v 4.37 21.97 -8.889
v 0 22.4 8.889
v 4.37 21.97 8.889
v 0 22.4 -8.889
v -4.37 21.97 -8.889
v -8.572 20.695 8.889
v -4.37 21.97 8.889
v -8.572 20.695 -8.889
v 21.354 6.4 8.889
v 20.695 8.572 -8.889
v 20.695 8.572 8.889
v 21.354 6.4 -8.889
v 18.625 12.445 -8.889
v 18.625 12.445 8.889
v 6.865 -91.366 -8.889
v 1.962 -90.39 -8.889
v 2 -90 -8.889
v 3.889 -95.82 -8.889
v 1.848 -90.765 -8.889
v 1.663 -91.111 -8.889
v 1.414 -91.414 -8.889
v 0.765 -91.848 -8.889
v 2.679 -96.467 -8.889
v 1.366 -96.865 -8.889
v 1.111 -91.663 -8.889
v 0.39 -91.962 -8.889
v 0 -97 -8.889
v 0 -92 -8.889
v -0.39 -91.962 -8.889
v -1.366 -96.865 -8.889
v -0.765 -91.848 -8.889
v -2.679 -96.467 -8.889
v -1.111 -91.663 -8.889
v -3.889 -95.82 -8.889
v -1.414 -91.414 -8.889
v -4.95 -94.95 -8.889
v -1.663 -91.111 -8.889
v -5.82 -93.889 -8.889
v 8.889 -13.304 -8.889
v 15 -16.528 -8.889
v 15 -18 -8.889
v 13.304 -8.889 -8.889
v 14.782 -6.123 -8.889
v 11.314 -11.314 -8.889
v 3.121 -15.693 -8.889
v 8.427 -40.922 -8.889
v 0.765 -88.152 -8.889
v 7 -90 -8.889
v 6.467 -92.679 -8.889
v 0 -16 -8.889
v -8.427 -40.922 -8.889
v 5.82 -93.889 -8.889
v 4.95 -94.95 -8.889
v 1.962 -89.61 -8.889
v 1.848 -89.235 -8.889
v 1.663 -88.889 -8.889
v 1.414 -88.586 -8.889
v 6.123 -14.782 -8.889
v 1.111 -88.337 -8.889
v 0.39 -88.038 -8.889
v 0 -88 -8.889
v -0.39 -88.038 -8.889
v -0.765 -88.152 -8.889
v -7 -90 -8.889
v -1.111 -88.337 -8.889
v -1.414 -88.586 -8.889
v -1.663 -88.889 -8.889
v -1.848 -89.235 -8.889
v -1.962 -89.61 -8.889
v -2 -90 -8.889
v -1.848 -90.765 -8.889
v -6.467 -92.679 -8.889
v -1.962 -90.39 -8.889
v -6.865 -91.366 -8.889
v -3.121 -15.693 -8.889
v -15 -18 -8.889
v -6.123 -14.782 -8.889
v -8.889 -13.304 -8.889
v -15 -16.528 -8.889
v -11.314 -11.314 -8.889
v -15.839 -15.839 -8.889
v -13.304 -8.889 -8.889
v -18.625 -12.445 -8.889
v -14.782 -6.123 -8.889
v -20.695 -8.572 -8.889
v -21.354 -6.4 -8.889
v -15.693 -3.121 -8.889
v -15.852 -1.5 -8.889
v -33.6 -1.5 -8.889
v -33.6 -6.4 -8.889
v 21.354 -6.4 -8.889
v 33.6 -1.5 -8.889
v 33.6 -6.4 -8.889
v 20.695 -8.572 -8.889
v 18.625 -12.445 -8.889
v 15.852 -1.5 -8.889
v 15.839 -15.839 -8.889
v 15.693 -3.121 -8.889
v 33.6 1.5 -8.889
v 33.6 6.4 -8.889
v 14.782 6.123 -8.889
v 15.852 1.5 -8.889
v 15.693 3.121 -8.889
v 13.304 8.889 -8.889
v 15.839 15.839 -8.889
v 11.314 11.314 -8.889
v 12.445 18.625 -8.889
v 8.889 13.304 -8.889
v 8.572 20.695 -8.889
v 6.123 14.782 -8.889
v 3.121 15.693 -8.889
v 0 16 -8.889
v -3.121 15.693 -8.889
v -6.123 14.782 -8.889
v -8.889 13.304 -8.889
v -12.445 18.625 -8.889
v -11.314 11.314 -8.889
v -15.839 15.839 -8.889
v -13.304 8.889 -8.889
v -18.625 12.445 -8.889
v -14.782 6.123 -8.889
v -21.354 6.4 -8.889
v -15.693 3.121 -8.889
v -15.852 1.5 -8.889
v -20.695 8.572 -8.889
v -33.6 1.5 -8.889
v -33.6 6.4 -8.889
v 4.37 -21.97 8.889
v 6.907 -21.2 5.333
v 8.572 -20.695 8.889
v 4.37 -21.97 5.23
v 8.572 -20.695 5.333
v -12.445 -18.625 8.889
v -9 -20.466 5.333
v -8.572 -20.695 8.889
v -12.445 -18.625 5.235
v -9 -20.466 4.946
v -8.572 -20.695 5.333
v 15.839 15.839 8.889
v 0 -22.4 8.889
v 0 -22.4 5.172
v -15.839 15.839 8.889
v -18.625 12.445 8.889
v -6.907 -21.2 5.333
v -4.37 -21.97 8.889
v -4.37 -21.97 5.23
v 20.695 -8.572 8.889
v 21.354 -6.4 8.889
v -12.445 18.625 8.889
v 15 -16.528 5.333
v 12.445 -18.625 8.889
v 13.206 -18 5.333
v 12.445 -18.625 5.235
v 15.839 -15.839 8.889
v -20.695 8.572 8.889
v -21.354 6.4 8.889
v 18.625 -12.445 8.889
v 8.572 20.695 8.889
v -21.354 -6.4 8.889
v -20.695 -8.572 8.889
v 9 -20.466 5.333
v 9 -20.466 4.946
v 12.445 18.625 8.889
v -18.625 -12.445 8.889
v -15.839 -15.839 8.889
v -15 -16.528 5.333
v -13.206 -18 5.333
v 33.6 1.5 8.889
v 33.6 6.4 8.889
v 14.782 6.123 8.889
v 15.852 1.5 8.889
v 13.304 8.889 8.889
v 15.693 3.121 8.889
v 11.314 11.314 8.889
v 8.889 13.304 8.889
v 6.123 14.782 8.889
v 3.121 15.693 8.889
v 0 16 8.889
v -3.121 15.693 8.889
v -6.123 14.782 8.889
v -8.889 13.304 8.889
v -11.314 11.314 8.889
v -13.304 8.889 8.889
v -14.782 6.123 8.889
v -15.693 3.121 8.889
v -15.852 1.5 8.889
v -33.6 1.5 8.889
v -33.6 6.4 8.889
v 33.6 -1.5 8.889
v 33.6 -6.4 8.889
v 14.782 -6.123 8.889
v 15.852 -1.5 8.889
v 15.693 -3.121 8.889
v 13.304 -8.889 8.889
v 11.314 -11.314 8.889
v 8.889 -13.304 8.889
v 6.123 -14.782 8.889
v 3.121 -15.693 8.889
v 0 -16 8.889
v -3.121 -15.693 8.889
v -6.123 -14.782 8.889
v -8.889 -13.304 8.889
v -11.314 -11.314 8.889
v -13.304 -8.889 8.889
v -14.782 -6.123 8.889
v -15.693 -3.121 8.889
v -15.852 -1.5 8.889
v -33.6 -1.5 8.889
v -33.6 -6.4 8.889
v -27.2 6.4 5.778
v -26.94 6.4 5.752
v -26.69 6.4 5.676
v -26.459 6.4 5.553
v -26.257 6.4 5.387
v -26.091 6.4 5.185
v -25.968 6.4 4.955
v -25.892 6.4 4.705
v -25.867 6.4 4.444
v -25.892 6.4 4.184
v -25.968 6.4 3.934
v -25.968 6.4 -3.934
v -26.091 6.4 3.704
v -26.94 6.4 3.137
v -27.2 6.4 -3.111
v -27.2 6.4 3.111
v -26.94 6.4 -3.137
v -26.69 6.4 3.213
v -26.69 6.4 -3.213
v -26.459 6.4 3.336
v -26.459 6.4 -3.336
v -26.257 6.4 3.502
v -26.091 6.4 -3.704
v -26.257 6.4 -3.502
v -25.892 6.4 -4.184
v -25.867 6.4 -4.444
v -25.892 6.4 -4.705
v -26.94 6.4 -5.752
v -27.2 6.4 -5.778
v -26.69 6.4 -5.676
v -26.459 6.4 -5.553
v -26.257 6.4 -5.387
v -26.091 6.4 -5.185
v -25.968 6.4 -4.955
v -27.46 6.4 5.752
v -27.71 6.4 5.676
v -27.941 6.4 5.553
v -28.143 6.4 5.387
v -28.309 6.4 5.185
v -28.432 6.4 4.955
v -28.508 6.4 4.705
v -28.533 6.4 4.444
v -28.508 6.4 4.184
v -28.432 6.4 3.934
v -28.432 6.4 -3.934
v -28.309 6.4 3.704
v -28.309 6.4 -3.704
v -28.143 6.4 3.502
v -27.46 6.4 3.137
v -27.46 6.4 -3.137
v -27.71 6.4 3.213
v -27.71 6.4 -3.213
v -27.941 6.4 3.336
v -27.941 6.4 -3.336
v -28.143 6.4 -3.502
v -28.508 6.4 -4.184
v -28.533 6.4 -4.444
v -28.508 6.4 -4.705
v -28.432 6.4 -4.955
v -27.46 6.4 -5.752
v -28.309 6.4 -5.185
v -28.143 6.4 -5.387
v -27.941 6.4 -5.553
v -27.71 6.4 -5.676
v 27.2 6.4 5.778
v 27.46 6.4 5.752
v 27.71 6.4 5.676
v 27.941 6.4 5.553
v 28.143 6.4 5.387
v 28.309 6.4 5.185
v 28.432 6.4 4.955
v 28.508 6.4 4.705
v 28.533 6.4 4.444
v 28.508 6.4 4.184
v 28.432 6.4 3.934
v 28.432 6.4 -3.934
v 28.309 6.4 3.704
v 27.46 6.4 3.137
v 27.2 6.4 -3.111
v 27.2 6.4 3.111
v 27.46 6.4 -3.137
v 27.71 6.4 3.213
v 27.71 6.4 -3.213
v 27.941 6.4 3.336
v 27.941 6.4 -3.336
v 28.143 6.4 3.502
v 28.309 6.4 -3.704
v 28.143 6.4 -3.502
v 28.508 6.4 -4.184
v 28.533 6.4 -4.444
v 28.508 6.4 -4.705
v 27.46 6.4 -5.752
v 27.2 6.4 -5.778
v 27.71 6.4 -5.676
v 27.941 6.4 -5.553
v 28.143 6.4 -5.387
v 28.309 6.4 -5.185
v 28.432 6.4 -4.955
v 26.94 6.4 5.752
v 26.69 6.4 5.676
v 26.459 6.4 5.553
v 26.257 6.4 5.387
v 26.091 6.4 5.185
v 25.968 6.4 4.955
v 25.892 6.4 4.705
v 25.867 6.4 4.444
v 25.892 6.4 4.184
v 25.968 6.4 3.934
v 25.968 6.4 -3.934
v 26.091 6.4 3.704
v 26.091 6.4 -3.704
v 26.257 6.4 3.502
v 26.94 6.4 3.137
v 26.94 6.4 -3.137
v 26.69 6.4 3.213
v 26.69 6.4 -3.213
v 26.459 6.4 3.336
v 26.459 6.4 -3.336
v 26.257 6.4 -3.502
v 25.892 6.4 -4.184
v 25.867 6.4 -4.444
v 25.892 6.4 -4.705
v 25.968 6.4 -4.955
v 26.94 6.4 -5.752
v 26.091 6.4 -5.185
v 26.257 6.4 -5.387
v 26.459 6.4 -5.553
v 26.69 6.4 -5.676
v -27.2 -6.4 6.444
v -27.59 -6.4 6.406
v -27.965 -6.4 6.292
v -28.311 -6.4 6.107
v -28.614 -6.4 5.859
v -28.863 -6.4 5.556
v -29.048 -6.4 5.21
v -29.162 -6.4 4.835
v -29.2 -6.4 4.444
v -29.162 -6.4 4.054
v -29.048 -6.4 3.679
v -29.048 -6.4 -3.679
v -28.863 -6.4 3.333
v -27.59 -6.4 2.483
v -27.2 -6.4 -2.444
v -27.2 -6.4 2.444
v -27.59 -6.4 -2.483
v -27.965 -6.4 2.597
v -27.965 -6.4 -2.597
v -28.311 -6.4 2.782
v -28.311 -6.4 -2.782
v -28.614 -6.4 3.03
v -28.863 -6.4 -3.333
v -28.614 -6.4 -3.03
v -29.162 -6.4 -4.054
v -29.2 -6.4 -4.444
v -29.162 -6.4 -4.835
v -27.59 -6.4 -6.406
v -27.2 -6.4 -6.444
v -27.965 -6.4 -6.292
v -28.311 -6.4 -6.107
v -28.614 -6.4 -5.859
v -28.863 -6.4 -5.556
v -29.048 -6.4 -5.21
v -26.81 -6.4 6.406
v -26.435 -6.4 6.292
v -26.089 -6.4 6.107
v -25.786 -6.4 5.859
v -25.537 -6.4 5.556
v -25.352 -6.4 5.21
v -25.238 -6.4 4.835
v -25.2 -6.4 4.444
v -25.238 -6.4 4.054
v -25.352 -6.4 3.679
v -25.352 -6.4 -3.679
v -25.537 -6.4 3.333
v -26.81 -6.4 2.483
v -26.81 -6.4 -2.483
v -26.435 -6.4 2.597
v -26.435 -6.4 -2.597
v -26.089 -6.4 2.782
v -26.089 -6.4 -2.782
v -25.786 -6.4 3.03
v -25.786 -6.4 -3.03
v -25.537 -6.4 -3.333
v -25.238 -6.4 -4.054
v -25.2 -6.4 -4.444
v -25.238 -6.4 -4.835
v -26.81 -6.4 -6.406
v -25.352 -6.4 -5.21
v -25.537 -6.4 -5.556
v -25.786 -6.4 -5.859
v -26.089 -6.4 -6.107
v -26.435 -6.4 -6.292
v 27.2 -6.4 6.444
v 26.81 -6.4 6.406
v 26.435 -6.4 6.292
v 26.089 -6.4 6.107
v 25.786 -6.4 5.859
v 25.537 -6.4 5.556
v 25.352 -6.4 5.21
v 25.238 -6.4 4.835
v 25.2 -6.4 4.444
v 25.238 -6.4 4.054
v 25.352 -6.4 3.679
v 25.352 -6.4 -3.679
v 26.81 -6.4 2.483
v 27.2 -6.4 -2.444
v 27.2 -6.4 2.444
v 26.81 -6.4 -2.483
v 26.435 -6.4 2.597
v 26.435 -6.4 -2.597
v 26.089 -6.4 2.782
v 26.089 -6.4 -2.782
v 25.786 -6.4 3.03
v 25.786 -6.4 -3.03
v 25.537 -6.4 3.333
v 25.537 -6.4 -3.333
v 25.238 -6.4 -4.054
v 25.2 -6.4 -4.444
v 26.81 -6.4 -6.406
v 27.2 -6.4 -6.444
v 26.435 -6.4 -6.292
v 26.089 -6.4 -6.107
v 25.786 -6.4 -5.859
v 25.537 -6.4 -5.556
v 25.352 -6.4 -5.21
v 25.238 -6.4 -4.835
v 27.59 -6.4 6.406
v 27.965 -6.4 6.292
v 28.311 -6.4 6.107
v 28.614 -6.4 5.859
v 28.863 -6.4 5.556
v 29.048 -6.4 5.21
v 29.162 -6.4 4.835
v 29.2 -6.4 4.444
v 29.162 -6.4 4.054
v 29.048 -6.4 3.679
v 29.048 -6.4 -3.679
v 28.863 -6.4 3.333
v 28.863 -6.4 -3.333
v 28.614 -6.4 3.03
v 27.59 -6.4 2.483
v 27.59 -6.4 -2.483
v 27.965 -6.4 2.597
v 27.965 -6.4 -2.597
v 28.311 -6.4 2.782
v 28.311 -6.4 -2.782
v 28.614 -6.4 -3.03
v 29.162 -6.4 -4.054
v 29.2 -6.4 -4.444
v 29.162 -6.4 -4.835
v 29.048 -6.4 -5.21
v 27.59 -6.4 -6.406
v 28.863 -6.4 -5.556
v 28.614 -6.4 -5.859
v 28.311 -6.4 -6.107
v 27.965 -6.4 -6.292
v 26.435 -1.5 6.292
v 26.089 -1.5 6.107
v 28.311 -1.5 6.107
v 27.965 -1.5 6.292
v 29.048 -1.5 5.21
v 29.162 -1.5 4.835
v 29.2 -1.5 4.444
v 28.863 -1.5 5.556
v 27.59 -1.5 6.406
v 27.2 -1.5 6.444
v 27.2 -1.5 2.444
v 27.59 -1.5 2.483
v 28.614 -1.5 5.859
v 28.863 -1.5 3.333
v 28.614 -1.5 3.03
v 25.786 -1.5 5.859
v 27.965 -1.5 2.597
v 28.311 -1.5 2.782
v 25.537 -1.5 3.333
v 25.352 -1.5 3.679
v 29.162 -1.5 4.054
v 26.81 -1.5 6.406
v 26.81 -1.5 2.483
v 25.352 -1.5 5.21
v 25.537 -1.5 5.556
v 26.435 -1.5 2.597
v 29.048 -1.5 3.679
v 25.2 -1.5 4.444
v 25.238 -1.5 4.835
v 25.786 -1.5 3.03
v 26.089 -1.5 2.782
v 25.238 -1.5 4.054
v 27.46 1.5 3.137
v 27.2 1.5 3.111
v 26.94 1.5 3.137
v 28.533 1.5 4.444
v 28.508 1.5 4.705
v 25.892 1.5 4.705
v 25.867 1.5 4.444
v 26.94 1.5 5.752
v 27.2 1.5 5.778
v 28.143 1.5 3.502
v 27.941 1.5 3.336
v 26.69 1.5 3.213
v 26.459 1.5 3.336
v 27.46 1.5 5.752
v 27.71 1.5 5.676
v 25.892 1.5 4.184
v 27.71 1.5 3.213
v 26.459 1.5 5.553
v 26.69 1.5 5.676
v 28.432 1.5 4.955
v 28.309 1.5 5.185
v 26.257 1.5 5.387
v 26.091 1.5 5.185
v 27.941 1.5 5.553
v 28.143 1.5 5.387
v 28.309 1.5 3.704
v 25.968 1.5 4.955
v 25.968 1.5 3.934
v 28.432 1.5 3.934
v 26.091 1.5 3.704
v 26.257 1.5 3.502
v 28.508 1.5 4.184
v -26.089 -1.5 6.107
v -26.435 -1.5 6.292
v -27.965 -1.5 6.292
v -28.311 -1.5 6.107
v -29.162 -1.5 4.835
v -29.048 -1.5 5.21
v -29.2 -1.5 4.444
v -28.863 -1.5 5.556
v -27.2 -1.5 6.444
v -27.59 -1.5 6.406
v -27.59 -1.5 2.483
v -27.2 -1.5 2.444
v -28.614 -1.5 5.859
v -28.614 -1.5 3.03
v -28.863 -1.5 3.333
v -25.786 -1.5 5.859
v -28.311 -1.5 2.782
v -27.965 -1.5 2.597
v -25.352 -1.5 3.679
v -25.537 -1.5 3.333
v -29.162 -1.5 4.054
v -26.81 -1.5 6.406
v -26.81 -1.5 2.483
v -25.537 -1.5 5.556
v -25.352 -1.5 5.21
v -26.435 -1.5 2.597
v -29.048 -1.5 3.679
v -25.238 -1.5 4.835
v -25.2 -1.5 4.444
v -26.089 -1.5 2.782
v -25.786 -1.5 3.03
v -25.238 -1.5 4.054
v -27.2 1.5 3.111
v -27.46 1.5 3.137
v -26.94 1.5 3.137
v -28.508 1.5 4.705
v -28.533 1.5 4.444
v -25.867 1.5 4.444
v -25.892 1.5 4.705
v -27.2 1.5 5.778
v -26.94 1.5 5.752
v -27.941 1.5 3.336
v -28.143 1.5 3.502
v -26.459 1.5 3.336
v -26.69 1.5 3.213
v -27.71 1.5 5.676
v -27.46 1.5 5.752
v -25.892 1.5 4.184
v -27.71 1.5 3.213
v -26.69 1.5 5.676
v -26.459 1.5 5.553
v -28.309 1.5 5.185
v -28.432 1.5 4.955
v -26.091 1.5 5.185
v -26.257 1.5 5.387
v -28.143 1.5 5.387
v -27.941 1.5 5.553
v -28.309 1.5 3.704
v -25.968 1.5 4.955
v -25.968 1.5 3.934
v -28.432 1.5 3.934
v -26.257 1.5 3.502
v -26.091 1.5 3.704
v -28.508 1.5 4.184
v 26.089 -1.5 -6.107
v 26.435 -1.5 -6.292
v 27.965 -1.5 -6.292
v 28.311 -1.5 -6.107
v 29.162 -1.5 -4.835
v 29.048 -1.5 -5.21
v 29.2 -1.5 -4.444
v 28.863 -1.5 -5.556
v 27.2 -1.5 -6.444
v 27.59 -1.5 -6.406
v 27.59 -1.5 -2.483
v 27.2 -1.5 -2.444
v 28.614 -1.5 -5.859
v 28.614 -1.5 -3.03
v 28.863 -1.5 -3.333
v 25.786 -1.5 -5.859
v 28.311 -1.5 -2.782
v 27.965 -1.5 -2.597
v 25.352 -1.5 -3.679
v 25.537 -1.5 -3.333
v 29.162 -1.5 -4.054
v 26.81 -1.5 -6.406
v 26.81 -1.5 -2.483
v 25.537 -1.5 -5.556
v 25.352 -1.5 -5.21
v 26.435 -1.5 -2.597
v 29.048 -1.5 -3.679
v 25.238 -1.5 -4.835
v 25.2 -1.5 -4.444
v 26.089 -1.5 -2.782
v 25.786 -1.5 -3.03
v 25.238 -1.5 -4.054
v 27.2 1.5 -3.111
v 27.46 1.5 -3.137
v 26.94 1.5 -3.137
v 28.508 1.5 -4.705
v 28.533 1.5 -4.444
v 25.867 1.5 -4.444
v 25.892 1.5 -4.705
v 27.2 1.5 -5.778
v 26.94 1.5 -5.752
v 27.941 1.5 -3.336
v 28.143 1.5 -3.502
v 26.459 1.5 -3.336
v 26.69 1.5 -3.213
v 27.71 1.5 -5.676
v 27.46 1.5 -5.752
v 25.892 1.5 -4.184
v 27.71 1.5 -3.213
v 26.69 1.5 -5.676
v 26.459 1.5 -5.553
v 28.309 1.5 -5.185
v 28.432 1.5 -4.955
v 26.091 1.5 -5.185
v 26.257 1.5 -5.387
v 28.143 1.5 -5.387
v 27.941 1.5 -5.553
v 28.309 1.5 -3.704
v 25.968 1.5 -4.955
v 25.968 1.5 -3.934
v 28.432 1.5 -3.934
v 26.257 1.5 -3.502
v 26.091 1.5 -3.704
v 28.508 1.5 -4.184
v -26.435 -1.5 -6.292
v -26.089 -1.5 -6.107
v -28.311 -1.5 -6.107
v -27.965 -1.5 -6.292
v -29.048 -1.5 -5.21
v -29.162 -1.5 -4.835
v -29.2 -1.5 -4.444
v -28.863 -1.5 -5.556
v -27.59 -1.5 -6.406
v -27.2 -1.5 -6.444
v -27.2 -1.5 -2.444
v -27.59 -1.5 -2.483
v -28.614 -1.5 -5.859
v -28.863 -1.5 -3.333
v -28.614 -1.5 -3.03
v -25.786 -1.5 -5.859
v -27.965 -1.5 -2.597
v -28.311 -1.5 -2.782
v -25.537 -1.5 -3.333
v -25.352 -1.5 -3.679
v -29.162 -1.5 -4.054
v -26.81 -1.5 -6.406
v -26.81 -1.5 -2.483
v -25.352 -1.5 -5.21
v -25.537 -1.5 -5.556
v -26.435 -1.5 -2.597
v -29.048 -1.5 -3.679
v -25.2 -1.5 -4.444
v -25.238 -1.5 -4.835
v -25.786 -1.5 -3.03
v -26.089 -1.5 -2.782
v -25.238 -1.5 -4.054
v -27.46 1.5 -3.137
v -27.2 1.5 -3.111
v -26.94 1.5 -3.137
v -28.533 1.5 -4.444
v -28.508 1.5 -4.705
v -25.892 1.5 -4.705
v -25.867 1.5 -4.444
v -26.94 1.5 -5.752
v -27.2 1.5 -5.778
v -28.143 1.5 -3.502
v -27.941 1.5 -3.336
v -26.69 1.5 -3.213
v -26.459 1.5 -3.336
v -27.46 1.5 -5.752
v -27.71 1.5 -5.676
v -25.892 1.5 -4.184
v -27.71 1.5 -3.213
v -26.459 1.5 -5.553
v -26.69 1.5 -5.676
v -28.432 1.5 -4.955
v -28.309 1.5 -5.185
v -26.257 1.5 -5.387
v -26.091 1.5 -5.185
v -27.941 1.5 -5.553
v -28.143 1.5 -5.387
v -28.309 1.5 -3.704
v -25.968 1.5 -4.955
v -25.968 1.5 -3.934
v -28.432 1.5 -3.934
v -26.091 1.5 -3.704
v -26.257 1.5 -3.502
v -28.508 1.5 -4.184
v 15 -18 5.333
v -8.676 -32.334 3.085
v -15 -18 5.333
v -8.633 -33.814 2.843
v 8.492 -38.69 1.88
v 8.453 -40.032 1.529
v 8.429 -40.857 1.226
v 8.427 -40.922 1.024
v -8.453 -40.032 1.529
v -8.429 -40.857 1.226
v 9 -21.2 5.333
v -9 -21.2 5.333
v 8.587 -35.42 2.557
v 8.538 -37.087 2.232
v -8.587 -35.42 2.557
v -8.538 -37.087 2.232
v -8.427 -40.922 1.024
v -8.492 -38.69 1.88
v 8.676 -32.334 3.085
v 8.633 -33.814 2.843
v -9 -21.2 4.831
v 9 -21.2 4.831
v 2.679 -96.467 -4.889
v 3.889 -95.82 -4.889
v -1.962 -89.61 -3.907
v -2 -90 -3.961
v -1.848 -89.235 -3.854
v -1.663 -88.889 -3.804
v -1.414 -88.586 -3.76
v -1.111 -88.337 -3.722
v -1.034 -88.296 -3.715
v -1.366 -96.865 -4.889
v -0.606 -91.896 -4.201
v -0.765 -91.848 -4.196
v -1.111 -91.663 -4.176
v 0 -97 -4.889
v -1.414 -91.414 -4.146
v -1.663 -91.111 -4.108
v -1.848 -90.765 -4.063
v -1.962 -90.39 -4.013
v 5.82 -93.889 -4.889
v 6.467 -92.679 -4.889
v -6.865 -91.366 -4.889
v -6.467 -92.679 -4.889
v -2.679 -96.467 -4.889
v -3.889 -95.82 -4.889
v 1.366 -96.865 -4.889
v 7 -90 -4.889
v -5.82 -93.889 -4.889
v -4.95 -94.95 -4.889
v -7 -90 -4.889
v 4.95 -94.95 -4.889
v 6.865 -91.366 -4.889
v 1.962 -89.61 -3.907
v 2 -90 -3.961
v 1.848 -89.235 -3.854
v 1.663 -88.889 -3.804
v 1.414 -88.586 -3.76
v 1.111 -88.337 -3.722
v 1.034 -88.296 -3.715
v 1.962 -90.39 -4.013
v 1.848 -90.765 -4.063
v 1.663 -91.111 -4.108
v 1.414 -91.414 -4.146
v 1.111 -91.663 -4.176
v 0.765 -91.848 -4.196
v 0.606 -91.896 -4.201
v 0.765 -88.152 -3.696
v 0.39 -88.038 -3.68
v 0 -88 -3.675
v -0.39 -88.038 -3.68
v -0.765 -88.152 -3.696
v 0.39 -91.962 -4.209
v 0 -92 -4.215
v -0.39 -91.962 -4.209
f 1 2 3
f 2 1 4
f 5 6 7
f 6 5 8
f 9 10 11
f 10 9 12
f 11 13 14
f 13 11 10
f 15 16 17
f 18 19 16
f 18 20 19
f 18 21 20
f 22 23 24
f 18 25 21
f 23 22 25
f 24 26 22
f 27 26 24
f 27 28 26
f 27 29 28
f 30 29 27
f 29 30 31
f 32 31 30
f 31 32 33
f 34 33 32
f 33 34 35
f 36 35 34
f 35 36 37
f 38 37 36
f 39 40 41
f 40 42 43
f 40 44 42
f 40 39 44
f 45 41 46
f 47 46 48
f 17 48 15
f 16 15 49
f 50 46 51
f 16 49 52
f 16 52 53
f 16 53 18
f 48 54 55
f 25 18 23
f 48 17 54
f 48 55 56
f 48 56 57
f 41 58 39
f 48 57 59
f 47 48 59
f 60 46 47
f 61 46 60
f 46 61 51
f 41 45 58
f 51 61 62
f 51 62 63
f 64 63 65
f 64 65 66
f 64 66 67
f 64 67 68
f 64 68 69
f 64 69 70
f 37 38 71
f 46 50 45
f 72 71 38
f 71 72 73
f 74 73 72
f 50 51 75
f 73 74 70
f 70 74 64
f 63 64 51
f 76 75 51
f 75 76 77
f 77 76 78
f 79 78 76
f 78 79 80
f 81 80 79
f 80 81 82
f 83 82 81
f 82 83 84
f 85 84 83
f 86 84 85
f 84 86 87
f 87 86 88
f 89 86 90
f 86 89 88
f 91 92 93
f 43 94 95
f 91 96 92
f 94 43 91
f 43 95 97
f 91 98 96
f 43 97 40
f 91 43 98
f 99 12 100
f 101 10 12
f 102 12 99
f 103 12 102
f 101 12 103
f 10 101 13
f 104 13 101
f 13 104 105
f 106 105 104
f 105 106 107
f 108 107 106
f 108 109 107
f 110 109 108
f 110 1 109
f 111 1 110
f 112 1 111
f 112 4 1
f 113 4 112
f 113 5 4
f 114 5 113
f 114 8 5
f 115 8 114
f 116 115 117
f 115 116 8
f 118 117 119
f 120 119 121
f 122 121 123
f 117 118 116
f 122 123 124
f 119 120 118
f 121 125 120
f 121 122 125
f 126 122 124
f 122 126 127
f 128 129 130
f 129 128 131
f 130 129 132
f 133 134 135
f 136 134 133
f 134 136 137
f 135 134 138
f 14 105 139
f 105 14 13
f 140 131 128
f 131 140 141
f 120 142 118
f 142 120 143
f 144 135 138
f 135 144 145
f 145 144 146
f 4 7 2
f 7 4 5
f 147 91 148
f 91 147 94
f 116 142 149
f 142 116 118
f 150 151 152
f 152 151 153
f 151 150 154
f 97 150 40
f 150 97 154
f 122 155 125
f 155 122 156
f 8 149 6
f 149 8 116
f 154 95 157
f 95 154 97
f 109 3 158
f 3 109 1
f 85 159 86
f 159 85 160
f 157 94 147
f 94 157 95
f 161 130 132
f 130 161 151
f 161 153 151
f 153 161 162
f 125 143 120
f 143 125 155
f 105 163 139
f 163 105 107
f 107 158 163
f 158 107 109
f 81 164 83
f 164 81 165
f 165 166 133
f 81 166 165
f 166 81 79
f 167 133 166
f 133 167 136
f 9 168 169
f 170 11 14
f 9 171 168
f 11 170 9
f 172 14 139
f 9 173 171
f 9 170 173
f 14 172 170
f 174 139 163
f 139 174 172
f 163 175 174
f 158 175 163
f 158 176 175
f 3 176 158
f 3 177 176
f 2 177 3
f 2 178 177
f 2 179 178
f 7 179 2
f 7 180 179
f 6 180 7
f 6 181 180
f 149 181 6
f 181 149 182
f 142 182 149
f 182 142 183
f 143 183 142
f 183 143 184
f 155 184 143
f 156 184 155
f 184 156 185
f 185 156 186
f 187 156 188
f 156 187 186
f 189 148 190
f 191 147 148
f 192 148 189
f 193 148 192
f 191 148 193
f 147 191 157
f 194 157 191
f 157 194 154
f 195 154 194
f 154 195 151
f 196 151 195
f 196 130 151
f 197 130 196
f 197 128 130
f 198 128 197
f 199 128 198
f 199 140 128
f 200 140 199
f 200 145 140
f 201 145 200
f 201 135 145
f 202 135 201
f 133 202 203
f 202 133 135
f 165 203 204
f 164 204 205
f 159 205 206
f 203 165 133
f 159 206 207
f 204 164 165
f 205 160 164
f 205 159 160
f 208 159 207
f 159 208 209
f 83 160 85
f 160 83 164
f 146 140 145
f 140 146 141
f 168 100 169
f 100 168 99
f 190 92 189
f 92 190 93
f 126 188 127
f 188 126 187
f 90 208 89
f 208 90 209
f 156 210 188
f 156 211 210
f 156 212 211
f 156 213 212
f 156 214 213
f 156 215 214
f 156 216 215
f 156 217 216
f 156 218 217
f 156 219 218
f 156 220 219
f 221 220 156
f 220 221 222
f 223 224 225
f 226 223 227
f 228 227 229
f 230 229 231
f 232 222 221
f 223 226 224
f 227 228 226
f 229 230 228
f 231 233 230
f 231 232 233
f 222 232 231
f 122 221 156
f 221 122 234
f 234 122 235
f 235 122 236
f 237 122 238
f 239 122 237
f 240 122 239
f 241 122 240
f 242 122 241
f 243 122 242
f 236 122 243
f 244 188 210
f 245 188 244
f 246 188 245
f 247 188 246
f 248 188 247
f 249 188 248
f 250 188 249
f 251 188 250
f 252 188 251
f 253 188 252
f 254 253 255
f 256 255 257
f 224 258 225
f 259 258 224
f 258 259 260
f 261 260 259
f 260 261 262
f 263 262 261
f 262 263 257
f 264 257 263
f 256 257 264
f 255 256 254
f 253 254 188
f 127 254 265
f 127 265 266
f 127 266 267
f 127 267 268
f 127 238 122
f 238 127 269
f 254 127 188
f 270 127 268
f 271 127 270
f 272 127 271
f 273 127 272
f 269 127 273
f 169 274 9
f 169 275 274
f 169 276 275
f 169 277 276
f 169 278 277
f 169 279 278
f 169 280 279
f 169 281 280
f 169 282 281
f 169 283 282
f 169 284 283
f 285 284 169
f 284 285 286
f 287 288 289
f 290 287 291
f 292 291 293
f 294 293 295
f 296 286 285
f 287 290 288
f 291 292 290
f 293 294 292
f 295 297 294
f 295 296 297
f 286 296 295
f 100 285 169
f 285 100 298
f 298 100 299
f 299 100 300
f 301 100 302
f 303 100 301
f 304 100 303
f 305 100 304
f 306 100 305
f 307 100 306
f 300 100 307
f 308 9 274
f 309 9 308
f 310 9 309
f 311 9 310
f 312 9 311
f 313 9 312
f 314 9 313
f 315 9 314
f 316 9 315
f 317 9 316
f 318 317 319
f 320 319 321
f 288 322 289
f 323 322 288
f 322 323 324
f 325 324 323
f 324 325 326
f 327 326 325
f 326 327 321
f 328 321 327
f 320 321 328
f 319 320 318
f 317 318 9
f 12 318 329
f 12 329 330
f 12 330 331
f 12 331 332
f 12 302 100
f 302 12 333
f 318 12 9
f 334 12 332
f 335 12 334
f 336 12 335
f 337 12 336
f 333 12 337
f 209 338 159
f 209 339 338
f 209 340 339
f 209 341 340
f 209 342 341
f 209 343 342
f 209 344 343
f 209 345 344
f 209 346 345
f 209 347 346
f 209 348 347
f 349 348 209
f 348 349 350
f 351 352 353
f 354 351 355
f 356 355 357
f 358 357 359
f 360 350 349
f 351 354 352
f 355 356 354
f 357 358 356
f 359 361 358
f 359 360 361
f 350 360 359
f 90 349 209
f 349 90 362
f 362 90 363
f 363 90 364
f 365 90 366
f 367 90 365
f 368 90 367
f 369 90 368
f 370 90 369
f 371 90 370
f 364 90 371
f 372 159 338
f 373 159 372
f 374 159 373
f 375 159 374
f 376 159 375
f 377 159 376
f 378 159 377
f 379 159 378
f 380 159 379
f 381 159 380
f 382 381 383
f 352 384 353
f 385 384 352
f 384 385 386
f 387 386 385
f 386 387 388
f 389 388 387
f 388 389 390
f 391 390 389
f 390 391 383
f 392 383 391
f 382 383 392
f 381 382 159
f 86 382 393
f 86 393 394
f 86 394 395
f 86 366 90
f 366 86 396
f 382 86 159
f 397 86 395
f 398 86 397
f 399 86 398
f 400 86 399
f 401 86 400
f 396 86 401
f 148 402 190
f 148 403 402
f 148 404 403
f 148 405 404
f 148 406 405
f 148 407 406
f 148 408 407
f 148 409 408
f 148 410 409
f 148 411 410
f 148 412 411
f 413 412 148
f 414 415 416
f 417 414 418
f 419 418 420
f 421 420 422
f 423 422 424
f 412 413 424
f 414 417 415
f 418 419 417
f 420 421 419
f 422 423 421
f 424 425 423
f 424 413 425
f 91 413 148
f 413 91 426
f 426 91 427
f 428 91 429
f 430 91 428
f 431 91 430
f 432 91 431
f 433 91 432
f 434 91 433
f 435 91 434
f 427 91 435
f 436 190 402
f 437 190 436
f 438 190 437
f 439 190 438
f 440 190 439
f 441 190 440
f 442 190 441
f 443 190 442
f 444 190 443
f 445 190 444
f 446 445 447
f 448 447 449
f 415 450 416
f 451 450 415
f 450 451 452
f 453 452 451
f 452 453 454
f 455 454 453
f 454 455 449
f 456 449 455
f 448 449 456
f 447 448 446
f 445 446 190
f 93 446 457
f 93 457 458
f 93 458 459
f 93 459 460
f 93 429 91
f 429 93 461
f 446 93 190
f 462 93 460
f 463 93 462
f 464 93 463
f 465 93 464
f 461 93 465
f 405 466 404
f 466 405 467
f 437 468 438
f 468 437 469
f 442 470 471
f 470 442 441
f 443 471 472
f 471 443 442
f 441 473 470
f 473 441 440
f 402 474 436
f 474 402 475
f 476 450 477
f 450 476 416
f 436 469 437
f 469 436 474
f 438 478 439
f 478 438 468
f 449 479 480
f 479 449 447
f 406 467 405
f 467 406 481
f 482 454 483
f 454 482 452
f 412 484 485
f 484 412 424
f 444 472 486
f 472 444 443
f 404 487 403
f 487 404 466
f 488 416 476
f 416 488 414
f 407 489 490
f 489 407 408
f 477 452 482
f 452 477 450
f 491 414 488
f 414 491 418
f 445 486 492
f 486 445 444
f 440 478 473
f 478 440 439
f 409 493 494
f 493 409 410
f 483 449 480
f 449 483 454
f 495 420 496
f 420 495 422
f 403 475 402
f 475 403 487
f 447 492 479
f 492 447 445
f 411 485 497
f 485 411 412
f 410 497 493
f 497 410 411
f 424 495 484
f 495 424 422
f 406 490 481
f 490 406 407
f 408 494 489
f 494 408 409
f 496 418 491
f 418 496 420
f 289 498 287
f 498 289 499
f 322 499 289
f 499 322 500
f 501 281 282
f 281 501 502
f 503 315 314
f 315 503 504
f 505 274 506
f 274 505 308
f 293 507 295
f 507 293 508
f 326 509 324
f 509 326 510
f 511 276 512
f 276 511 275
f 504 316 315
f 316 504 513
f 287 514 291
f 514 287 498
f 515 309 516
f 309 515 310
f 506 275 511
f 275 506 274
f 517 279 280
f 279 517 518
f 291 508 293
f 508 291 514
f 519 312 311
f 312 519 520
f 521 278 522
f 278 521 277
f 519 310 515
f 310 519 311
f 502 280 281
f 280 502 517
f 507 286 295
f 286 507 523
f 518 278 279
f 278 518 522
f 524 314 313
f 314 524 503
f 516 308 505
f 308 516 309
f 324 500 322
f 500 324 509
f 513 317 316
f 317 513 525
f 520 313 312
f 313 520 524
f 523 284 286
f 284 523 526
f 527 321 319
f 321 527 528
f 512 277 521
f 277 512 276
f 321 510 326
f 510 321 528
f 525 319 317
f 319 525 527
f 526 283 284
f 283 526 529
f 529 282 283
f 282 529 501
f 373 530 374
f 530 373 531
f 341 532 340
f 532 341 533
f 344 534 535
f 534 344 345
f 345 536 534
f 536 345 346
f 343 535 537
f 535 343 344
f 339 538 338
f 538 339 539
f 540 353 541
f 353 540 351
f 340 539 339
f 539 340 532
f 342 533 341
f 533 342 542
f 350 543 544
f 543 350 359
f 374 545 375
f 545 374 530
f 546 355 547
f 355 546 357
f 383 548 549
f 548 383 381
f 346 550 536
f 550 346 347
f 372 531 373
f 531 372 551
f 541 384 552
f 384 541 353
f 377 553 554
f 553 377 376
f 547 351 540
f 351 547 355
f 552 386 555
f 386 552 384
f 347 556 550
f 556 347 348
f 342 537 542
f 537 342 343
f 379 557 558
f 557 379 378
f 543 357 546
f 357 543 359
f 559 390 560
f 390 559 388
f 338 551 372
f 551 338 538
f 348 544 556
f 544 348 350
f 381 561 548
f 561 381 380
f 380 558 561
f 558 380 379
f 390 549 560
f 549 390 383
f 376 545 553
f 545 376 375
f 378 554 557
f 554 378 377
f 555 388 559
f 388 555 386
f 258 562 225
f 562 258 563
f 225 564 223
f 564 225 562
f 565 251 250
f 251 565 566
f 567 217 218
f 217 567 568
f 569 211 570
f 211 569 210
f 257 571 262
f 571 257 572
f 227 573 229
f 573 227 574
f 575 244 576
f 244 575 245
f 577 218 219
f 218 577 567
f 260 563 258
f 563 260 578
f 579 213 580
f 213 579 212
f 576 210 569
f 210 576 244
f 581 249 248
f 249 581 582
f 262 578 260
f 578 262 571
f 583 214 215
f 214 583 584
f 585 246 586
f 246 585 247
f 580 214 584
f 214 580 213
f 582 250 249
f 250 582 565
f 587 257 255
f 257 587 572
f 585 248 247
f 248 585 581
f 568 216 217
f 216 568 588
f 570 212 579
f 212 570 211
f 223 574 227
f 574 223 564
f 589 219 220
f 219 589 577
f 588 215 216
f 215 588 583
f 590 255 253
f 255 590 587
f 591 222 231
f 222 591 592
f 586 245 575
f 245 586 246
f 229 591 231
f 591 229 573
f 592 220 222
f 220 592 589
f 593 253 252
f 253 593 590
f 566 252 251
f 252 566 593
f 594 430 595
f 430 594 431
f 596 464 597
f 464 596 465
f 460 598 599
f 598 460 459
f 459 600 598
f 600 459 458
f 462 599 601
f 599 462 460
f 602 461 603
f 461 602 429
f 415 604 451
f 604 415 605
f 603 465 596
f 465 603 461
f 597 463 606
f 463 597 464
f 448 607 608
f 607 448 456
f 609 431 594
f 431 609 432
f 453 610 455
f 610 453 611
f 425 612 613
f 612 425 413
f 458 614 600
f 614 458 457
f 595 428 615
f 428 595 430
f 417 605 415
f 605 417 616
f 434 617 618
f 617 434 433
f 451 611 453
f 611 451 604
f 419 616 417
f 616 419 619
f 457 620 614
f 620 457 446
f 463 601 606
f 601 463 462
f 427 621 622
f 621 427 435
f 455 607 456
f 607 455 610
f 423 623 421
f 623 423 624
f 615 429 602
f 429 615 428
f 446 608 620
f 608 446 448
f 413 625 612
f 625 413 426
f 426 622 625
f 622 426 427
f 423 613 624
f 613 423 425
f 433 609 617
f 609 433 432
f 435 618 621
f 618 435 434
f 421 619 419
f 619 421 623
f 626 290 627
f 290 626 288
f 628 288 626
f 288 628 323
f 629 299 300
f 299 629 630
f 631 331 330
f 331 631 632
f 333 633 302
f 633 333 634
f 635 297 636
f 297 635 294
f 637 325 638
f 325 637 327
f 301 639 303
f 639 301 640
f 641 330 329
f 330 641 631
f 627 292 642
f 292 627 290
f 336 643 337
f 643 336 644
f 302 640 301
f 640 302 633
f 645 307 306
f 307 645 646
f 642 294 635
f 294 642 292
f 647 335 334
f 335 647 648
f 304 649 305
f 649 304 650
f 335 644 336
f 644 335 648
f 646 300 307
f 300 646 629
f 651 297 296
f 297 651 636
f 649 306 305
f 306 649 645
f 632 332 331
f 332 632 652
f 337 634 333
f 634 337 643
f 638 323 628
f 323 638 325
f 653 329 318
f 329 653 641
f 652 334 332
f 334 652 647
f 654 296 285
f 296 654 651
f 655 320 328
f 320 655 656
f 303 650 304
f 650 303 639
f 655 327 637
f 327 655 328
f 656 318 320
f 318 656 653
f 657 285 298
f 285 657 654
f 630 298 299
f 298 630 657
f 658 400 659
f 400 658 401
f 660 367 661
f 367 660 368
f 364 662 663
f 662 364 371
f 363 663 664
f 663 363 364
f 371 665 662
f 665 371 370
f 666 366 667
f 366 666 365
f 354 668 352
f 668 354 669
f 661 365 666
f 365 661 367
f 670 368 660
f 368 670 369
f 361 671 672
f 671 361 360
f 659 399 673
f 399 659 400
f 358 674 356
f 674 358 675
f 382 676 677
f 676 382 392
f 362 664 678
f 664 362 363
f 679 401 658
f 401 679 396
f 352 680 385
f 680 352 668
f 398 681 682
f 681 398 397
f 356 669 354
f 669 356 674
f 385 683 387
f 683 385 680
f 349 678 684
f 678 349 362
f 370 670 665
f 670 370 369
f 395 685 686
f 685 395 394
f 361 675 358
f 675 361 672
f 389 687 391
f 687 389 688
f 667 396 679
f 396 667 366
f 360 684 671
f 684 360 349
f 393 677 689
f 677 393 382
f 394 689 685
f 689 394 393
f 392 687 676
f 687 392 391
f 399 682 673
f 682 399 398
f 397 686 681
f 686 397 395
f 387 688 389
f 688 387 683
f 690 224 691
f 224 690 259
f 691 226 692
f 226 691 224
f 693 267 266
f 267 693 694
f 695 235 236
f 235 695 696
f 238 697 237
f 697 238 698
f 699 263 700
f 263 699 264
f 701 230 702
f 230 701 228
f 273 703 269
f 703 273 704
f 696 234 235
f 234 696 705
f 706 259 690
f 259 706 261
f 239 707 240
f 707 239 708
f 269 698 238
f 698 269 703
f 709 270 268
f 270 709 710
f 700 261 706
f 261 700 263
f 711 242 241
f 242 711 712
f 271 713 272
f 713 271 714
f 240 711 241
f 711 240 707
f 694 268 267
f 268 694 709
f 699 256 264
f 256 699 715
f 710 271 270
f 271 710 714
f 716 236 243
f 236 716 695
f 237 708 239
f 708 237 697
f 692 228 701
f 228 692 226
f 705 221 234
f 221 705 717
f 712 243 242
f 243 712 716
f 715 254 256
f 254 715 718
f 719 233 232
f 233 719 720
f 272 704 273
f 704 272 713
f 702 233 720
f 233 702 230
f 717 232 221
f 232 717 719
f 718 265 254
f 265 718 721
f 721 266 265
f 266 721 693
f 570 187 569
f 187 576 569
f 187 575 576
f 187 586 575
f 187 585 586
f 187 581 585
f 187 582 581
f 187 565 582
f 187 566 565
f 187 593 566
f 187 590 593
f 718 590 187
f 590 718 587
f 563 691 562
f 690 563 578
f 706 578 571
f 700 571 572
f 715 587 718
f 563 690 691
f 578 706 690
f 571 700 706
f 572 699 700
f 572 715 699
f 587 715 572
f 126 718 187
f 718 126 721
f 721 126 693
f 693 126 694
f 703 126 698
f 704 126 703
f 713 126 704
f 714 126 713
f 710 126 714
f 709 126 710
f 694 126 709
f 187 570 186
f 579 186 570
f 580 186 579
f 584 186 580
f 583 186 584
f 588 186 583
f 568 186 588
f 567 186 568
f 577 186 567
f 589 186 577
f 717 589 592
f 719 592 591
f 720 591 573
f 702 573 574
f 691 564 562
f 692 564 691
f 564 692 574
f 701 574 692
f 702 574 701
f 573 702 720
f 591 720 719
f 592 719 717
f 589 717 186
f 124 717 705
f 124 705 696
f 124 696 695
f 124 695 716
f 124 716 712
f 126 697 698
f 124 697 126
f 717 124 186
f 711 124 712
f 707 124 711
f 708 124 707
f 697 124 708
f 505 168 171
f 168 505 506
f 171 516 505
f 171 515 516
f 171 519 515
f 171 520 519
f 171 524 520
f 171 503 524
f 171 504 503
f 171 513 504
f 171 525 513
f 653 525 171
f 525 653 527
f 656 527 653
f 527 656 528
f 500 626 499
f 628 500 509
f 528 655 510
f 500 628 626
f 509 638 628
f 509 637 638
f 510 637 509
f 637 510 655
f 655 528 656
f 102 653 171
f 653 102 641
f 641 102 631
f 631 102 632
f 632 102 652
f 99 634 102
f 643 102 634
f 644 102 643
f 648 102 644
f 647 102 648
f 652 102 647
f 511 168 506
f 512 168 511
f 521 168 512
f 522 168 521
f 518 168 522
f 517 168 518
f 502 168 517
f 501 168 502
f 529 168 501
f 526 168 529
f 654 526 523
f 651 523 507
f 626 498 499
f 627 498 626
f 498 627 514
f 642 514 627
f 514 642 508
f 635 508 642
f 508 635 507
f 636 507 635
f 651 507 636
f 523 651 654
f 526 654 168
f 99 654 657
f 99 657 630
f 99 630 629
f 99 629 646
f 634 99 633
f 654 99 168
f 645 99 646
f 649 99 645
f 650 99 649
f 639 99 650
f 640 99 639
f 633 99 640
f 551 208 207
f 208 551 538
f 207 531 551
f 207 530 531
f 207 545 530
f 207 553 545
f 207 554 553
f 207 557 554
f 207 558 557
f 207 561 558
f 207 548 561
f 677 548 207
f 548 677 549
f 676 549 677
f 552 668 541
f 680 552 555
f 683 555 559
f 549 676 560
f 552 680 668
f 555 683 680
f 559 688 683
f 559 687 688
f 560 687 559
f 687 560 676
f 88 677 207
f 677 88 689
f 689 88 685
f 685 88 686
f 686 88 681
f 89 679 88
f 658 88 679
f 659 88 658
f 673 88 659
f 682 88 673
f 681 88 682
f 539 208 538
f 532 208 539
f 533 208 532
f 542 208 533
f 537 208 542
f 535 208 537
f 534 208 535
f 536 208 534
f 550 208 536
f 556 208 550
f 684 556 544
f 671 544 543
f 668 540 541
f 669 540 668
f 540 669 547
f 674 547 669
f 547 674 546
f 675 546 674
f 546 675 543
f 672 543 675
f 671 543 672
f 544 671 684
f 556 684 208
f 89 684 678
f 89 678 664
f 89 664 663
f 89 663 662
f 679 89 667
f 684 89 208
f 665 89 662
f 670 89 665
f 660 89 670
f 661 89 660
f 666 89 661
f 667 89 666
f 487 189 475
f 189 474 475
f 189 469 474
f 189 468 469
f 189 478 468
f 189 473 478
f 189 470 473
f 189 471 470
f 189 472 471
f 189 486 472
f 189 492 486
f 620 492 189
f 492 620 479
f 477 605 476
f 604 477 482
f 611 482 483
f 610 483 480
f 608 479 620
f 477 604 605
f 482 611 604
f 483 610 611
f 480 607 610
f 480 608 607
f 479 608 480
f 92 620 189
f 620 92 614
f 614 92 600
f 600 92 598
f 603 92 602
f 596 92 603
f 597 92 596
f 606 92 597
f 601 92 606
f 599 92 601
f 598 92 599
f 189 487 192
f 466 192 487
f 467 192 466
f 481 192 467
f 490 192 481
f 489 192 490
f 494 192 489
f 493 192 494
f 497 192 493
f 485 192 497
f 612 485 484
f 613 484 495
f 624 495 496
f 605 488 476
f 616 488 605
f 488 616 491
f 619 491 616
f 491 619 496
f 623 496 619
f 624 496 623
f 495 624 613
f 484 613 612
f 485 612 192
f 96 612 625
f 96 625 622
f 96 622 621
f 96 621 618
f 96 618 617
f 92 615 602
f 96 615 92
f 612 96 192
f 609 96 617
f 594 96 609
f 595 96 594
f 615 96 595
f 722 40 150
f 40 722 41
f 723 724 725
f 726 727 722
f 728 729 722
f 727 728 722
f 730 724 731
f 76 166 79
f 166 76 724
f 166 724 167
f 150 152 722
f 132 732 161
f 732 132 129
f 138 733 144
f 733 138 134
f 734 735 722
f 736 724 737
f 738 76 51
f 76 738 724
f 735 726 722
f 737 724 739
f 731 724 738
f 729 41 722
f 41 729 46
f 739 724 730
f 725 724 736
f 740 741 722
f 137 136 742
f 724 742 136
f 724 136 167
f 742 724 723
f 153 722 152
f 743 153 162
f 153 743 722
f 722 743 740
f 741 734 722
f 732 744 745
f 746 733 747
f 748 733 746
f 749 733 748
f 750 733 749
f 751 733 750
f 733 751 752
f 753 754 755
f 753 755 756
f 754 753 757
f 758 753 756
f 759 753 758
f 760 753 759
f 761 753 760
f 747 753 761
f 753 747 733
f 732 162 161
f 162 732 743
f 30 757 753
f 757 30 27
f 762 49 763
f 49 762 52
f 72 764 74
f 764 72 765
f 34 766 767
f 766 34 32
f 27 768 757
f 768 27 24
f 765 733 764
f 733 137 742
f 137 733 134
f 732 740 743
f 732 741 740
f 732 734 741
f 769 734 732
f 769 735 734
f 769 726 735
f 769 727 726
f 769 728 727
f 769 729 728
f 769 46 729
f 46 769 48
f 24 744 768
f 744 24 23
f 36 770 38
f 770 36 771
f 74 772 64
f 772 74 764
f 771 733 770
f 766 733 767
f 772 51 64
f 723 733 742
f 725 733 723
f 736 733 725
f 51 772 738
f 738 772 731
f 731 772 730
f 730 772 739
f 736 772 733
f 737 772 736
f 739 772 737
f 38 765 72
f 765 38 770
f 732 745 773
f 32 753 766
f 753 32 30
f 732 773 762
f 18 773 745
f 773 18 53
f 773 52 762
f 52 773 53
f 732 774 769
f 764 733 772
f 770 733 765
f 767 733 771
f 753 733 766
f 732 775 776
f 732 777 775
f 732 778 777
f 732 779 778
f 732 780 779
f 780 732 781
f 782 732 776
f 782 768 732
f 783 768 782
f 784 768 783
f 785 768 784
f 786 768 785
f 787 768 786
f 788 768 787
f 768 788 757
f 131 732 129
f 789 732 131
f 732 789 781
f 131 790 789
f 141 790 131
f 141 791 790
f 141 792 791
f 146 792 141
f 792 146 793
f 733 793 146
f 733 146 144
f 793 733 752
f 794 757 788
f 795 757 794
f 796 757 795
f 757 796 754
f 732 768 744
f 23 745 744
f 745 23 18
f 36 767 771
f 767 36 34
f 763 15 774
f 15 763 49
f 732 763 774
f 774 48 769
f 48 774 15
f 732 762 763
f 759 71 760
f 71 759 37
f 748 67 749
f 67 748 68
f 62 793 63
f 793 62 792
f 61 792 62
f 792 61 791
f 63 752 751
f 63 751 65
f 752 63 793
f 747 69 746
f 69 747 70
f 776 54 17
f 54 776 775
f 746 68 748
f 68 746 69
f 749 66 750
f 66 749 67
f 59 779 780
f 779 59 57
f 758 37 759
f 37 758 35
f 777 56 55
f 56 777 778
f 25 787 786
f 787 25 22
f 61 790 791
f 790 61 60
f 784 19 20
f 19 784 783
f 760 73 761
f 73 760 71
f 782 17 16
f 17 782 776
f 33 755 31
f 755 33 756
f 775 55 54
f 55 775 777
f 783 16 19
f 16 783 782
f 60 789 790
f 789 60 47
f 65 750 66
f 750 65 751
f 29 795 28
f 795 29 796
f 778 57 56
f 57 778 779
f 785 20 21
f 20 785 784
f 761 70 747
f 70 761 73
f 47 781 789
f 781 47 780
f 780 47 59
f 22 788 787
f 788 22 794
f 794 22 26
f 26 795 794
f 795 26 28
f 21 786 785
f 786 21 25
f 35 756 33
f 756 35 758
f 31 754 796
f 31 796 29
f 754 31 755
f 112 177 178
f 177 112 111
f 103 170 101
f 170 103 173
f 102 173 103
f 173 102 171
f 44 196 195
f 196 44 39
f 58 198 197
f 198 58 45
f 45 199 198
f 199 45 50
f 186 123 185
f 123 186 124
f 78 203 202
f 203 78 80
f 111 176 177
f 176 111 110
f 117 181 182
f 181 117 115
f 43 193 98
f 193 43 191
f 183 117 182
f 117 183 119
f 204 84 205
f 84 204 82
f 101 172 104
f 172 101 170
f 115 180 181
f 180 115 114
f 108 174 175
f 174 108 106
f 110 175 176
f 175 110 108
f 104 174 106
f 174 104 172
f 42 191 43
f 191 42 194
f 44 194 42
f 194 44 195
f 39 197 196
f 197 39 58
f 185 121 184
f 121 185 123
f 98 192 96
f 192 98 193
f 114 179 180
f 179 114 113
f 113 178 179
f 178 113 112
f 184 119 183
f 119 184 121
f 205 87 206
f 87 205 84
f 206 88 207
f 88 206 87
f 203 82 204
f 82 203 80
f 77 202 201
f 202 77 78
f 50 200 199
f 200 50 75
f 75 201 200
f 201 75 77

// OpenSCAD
shaft_diameter = 32;  // 32mm = 1 1/4 inch
//shaft_diameter = 150;  // 1 1/4 inch
height = shaft_diameter/1.8;

screw_height = height*1;
screw_radius = shaft_diameter/16;
slot=3;

arm_len=90;
thickness=4;


$fn=32;
   
   
module screw_holes() {
  rotate([90, 0, 0])
     translate([shaft_diameter*.85, screw_height/4, 0]) {
         cylinder(r=screw_radius, h= shaft_diameter/2+1);
        mirror([0,0,1])
            cylinder(r=screw_radius/1.5, h= shaft_diameter/2+1);
     }
 }
    
module ring() {
  difference() {
    union() {
        difference() {
            union() {
                cylinder(r=shaft_diameter/2*1.4, h=height, center=true);
                cube([shaft_diameter*2.1, shaft_diameter*.4, screw_height], center=true);
            }
        }
    }
    
    screw_holes();
    mirror()
        screw_holes();
    mirror([0,0,1]) {
        screw_holes();
        mirror()
            screw_holes();
    }
    cube([shaft_diameter*3, slot, screw_height+10], center=true);
     }           
  }

arm_ratio=.8;
module arm() {
 difference() {
  union() {
      hull() {
      translate([ -shaft_diameter/2*1, 0, -height/2+height*arm_ratio/2])
              cube([thickness, arm_len/3, height*arm_ratio], center=true);
      translate([-arm_len/2, 0, -height/2])        
        cylinder(r=7, h=height/2);
      }
      
    hull() {
      translate([ -shaft_diameter/2*1.2, 0, -height/2+height*arm_ratio/2])
        cube([thickness, arm_len/5, height*arm_ratio], center=true);
      translate([-arm_len, 0, -height/2])        
        cylinder(r=7, h=4);
    }
  }
  translate([-arm_len, 0, 0])
    cylinder(r=2, h=100, center=true);
 }
}


difference() {
    union() {
        ring();
        rotate(90)
            arm();
    }
    cylinder(r=shaft_diameter/2, h=screw_height+10, center=true);
}
